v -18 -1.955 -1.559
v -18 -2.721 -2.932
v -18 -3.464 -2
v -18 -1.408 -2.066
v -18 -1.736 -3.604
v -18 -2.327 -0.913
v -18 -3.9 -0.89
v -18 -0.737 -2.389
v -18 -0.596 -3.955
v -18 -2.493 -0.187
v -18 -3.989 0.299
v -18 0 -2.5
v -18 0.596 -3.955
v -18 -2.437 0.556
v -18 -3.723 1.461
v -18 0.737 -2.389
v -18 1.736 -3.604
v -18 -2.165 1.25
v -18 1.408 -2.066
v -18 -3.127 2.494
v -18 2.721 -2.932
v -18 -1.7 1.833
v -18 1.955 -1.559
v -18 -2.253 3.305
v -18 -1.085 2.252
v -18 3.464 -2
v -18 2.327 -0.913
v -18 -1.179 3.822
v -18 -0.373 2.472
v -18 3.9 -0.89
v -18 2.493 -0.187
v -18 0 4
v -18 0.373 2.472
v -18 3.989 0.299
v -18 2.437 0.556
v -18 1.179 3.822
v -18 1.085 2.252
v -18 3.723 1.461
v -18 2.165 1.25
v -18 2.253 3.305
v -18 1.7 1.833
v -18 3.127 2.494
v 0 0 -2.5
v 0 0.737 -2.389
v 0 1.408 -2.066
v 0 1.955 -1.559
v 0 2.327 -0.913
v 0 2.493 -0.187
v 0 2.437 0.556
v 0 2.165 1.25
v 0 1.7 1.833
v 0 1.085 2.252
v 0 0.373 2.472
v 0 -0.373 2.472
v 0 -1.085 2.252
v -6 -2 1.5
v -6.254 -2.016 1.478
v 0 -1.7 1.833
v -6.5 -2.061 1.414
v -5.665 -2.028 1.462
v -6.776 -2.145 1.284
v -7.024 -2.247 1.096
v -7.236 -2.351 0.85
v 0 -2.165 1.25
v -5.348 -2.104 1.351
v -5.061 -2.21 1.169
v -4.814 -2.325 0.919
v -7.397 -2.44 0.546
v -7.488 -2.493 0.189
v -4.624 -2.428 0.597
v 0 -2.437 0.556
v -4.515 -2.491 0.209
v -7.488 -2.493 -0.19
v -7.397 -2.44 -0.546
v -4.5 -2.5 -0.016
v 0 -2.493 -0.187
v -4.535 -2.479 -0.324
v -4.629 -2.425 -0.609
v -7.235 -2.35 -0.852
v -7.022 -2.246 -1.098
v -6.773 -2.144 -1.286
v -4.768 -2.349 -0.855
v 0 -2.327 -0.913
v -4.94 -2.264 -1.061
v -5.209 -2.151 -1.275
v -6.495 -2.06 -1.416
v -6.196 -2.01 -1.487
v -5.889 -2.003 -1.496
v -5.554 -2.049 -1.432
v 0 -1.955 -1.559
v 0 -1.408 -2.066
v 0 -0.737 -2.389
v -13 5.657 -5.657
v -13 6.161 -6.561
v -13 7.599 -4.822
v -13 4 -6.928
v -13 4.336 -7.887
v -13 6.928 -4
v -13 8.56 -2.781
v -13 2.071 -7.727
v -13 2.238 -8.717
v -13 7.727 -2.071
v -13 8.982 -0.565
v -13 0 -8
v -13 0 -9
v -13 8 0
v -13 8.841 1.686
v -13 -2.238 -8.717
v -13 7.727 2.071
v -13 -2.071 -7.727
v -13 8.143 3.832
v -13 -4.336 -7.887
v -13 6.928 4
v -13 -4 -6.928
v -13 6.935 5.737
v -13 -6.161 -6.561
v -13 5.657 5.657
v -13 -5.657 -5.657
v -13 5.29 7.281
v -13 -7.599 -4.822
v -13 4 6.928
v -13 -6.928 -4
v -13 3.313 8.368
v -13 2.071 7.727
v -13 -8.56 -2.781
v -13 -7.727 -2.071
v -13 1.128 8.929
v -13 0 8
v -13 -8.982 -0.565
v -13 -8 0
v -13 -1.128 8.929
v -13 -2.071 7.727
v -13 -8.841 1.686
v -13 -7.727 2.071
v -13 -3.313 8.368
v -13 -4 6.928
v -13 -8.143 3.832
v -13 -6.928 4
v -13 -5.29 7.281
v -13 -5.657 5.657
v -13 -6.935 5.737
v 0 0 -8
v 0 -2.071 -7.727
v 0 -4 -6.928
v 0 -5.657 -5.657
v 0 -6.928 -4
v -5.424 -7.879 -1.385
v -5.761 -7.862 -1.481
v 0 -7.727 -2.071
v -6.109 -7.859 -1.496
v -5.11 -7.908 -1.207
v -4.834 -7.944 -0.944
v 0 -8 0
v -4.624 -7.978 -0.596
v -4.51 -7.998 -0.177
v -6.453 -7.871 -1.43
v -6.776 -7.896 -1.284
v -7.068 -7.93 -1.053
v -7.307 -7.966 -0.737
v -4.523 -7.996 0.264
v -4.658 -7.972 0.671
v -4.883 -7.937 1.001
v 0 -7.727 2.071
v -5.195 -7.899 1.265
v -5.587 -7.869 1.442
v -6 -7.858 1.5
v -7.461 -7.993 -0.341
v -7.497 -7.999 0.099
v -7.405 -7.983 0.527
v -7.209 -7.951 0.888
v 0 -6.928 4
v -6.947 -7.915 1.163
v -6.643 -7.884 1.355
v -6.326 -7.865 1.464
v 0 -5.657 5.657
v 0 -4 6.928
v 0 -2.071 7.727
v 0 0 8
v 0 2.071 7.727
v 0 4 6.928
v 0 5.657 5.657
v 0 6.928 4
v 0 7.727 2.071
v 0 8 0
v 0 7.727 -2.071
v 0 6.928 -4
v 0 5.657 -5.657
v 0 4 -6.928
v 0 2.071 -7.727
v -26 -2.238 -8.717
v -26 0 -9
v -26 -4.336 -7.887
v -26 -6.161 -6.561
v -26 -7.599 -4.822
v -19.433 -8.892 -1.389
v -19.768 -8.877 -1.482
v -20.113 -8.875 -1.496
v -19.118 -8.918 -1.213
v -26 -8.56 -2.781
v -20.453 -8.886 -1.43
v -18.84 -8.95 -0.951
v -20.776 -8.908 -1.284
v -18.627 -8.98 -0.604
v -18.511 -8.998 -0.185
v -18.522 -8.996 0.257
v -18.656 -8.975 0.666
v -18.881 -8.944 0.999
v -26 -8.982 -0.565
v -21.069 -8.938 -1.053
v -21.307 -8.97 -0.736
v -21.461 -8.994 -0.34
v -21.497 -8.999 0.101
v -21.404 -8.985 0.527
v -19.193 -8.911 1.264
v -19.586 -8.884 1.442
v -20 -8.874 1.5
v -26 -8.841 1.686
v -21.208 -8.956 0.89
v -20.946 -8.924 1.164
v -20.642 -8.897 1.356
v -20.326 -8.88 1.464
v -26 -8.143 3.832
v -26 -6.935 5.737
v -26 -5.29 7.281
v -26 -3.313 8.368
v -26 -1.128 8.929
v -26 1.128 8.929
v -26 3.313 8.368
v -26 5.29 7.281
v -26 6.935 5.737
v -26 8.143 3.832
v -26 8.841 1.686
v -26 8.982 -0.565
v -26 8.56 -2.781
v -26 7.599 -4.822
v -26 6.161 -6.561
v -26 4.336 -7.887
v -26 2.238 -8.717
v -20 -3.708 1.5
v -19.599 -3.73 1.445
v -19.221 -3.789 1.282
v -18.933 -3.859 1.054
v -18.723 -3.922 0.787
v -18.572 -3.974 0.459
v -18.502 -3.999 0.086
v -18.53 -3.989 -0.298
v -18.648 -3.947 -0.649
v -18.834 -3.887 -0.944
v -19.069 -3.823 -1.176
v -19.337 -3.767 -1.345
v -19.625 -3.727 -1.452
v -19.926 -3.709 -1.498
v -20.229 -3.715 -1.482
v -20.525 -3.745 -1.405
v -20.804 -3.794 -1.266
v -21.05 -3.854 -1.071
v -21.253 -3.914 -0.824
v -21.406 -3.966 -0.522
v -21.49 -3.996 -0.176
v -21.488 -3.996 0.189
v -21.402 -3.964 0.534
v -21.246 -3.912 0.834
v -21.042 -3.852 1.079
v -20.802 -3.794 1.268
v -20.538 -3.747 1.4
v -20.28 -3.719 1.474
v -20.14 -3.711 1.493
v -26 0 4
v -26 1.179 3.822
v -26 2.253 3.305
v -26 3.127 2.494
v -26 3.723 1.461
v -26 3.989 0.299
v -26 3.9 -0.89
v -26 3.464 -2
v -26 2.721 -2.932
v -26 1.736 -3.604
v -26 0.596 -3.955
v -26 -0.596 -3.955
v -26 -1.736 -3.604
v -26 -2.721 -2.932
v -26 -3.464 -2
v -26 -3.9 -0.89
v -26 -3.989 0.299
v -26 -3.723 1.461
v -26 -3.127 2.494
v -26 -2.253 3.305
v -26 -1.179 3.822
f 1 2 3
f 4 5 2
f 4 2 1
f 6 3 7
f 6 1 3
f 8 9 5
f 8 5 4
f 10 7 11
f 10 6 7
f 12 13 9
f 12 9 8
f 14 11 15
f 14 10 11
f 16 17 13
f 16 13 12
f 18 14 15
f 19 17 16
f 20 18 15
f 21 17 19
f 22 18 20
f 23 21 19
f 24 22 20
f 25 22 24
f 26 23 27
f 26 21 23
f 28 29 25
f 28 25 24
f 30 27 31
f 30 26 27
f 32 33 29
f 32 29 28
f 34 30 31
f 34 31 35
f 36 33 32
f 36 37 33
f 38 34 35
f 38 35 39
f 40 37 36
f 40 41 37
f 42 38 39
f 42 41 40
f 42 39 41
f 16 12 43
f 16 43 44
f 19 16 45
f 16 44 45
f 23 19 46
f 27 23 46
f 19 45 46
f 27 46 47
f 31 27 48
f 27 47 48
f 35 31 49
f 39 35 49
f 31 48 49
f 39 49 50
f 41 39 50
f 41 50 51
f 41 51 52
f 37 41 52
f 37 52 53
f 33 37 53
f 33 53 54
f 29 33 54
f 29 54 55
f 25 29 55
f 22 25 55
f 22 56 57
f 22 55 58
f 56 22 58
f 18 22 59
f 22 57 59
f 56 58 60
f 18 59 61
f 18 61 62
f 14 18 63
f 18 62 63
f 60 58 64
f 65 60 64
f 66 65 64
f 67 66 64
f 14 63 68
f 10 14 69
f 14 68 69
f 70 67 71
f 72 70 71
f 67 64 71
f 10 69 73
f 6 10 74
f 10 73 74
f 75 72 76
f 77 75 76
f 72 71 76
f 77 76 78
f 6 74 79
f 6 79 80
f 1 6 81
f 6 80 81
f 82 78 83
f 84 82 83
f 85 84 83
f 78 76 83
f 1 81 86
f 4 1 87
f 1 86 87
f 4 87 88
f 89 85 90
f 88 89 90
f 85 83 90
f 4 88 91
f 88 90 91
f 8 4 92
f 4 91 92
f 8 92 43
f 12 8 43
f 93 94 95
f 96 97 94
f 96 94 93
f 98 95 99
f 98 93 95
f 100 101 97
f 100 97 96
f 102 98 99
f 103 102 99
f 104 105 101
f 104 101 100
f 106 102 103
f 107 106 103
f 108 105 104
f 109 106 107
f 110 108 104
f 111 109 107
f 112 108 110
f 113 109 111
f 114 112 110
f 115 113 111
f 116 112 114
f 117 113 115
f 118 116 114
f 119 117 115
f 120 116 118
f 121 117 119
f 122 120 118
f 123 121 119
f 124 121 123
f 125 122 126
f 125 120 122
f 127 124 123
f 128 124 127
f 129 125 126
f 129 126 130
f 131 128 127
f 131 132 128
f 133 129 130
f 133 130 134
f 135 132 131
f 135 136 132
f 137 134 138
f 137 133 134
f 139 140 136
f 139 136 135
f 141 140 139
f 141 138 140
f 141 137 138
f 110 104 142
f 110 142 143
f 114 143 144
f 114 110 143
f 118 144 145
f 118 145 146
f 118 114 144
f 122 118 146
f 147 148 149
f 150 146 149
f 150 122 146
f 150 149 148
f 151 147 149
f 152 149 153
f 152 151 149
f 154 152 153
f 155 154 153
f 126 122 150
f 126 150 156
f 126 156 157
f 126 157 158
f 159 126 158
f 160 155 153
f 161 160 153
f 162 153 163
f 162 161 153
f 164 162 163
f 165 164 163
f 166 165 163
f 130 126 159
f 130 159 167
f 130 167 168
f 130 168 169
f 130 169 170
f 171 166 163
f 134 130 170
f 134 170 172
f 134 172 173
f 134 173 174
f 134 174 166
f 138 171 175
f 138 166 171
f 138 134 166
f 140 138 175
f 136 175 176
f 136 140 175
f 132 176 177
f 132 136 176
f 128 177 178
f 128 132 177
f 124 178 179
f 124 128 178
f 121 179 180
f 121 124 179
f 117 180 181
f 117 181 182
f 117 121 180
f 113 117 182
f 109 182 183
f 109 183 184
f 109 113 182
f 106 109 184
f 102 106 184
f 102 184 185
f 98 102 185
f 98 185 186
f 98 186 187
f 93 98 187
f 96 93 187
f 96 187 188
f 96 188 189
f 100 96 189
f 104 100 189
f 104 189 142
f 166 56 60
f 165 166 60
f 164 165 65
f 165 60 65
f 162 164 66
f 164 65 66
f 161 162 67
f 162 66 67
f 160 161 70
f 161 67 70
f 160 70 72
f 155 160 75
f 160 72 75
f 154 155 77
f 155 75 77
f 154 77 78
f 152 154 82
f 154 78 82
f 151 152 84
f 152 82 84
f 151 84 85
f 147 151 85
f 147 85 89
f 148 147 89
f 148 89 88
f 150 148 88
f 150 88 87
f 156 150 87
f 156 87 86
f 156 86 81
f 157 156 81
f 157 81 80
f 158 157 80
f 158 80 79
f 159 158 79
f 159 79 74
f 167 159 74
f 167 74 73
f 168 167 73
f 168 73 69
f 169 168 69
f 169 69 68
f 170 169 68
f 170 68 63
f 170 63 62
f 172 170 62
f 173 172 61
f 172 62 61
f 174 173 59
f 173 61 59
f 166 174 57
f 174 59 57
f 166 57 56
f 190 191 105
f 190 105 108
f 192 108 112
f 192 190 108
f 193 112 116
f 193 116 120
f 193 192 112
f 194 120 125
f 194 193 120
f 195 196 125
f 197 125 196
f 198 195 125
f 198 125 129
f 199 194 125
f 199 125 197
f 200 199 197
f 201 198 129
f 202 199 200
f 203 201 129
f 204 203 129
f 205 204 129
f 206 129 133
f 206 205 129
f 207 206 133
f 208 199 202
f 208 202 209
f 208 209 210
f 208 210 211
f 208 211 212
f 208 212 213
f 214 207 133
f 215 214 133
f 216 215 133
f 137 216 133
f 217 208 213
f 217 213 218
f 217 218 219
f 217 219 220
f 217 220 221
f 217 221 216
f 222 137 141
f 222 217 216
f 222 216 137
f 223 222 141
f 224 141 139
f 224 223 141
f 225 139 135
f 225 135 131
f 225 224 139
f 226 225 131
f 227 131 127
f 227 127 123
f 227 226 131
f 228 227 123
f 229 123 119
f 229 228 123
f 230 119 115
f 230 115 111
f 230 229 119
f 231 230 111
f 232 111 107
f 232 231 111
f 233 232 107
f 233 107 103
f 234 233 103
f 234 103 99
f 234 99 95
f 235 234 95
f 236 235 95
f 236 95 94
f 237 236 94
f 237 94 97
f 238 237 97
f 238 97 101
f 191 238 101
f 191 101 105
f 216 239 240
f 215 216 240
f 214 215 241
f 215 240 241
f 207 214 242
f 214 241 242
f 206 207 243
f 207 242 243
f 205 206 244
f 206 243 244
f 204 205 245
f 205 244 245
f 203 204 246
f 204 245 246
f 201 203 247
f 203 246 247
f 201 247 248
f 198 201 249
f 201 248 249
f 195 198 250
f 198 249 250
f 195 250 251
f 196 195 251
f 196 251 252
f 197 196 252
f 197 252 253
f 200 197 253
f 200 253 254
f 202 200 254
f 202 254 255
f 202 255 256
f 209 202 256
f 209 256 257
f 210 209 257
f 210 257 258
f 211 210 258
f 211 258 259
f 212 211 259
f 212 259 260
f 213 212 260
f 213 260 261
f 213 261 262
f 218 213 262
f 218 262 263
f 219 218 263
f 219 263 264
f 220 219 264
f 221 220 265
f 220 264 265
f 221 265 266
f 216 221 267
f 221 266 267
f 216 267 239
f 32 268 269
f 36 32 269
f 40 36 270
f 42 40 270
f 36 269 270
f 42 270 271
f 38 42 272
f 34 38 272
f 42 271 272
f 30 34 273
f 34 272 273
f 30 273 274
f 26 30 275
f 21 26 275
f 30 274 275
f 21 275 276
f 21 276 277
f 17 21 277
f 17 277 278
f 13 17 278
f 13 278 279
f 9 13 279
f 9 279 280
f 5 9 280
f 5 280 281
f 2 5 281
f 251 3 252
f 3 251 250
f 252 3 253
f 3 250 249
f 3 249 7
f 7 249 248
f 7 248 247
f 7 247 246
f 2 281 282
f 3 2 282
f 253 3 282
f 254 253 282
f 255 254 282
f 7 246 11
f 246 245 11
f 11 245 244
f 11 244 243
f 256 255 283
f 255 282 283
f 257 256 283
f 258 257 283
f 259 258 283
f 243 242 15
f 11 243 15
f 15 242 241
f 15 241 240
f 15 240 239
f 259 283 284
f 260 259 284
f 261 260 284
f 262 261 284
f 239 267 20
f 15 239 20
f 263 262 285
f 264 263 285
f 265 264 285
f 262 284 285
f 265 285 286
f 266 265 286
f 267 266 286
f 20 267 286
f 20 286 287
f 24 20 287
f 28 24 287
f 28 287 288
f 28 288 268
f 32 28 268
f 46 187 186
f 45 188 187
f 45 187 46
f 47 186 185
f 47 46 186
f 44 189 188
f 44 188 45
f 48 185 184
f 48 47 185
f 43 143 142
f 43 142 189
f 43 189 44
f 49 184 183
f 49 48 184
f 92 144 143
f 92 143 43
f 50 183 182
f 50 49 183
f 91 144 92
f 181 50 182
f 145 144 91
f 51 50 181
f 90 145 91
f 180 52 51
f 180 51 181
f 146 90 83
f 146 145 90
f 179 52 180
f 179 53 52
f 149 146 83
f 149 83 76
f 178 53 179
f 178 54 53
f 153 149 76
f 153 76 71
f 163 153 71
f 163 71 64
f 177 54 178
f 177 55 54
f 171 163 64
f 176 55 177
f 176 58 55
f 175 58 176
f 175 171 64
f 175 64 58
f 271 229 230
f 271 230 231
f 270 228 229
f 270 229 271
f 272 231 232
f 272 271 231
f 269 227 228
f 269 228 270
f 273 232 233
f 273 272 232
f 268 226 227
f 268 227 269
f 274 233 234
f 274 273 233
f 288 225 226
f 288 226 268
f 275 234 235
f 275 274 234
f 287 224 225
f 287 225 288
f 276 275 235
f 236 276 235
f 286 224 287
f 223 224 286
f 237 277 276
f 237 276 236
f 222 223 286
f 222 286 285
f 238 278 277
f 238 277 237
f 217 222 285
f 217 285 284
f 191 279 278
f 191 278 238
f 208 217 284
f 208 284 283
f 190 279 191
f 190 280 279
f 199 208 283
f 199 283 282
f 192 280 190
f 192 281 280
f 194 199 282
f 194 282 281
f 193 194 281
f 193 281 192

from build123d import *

# Parameters (mm, degrees)
ESQUISSE2_R             = 2.5
ENL_V_MAT_EXTRU_1_DEPTH = 29.948229652
ESQUISSE3_R             = 4
ENL_V_MAT_EXTRU_2_DEPTH = 8
ESQUISSE4_R             = 1.5
ENL_V_MAT_EXTRU_3_DEPTH = 29.948229652


with BuildPart() as part:
    # Esquisse1 → Révolution1 (revolve)
    with BuildSketch(Plane.XY, mode=Mode.PRIVATE) as r_volution1_sk:
        Polygon((0, 0), (0, 8), (-13, 8), (-13, 9), (-26, 9), (-26, 0), align=None)
    revolve(r_volution1_sk.sketch.rotate(Axis((0, 0, 0), (-1, 0, 0)), 90), axis=Axis((0, 0, 0), (-1, 0, 0)))

    # Esquisse2 → Enlèv. mat.-Extru.1 (cut, through all)
    with BuildSketch(Plane(origin=(0, 0, 0), x_dir=(0, 0, -1), z_dir=(1, 0, 0))):
        Circle(ESQUISSE2_R)
    extrude(amount=-ENL_V_MAT_EXTRU_1_DEPTH, mode=Mode.SUBTRACT)

    # Esquisse3 → Enlèv. mat.-Extru.2 (cut)
    with BuildSketch(Plane.ZY.offset(26)):
        Circle(ESQUISSE3_R)
    extrude(amount=-ENL_V_MAT_EXTRU_2_DEPTH, mode=Mode.SUBTRACT)

    # Esquisse4 → Enlèv. mat.-Extru.3 (cut, through all)
    with BuildSketch(Plane(origin=(0, 0, 0), x_dir=(1, 0, 0), z_dir=(0, 1, 0))):
        with Locations(Location((-20, 0, 0), (0, 0, 270))):
            Circle(ESQUISSE4_R)
        with Locations(Location((-6, 0, 0), (0, 0, 270))):
            Circle(ESQUISSE4_R)
    extrude(amount=-ENL_V_MAT_EXTRU_3_DEPTH, mode=Mode.SUBTRACT)


solid = part.part
